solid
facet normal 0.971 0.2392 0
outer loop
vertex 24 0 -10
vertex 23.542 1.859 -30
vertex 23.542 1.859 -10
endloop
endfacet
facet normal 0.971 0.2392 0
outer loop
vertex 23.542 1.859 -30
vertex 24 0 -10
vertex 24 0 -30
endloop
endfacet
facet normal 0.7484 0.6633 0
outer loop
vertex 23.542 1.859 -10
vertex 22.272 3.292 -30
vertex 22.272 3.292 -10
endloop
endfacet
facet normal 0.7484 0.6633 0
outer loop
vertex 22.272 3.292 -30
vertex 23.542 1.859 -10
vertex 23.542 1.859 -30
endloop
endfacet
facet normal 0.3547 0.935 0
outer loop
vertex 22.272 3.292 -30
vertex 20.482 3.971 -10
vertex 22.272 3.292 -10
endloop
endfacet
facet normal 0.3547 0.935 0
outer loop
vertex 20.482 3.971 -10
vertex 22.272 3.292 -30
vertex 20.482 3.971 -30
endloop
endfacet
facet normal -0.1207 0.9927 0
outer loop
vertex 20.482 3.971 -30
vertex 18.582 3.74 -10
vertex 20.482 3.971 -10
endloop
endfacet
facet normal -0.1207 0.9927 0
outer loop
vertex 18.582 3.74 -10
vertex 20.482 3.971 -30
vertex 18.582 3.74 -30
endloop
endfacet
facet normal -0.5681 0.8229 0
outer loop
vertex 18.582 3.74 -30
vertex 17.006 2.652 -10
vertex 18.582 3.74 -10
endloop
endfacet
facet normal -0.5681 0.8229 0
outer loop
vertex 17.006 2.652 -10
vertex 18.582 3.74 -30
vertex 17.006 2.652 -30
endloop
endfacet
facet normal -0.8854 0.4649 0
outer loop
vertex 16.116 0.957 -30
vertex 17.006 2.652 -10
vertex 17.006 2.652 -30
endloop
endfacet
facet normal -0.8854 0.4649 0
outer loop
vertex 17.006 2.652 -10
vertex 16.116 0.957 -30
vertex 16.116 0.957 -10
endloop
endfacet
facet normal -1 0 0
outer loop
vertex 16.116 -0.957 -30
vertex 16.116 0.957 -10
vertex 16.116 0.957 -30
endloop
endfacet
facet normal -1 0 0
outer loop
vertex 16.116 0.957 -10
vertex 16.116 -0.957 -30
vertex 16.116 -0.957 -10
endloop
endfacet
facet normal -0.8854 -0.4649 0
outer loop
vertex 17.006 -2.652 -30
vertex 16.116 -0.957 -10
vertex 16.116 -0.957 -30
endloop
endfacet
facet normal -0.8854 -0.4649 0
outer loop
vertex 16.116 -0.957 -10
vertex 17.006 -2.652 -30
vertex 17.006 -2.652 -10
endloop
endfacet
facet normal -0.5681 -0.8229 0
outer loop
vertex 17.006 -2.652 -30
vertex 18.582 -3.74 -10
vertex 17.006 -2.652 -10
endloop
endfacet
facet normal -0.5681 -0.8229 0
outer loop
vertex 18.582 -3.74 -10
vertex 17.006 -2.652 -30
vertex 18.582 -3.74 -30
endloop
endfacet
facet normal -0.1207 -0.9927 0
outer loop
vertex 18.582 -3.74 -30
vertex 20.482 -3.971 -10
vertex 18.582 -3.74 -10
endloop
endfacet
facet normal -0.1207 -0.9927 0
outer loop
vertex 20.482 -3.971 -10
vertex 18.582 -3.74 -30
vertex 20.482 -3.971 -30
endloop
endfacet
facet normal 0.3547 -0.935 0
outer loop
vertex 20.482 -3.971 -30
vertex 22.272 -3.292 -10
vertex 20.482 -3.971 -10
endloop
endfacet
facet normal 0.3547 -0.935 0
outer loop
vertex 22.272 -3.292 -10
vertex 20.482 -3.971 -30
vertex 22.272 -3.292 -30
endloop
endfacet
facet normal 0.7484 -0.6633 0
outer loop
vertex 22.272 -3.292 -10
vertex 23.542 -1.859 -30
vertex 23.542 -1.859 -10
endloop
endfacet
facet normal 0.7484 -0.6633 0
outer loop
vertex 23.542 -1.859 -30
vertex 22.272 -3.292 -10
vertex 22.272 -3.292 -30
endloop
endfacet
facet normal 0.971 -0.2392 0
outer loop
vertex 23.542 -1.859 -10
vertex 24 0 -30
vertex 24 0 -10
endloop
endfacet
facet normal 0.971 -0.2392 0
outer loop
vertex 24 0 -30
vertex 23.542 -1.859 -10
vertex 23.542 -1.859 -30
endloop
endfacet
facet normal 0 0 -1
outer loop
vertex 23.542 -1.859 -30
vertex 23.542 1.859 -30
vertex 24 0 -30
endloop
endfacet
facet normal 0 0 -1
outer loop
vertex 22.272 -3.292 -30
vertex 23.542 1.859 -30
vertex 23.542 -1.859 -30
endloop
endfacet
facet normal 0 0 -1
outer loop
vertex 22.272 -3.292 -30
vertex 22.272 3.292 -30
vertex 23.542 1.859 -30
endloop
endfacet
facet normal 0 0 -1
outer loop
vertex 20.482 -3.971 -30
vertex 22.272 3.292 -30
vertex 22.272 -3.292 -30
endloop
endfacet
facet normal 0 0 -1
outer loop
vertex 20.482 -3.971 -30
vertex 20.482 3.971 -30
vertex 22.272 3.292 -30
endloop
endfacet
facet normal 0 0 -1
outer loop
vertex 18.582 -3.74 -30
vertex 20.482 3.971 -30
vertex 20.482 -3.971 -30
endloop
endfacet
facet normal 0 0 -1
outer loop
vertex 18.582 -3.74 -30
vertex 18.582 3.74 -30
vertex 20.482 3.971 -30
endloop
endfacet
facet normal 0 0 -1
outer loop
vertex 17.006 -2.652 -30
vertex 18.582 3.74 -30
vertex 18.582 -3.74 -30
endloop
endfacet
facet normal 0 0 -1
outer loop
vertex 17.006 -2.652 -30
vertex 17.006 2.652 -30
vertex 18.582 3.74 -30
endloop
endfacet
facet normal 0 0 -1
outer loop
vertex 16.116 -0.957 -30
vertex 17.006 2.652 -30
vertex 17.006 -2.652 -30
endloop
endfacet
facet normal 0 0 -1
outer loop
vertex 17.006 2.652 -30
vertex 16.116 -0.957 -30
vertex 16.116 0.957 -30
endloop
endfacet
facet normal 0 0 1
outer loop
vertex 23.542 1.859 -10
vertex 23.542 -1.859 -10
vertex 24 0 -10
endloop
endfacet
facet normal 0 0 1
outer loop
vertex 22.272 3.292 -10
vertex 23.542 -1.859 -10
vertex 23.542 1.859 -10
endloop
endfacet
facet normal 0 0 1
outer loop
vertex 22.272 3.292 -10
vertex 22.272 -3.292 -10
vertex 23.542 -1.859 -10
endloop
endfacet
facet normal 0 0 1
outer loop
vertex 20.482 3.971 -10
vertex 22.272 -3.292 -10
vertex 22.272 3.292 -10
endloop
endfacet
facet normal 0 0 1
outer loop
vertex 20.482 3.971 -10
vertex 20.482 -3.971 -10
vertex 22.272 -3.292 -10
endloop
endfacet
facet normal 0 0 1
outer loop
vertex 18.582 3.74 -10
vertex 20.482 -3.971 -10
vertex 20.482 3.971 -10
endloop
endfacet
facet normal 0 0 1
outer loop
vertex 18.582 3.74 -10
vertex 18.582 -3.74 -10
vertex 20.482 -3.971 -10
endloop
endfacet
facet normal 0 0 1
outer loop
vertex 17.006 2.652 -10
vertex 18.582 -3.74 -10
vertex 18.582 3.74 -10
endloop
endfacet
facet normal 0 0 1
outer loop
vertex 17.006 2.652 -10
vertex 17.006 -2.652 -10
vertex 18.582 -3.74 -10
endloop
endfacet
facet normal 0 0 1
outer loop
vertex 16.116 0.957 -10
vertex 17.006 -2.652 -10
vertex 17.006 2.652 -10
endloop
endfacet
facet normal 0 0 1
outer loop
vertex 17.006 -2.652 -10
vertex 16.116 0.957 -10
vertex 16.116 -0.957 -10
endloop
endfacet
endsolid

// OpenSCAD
// Generated by generate_scads.py
translate([20,0,-30]) {
  intersection() {
    cylinder(h=20, r=4, center=false);
  }
}
